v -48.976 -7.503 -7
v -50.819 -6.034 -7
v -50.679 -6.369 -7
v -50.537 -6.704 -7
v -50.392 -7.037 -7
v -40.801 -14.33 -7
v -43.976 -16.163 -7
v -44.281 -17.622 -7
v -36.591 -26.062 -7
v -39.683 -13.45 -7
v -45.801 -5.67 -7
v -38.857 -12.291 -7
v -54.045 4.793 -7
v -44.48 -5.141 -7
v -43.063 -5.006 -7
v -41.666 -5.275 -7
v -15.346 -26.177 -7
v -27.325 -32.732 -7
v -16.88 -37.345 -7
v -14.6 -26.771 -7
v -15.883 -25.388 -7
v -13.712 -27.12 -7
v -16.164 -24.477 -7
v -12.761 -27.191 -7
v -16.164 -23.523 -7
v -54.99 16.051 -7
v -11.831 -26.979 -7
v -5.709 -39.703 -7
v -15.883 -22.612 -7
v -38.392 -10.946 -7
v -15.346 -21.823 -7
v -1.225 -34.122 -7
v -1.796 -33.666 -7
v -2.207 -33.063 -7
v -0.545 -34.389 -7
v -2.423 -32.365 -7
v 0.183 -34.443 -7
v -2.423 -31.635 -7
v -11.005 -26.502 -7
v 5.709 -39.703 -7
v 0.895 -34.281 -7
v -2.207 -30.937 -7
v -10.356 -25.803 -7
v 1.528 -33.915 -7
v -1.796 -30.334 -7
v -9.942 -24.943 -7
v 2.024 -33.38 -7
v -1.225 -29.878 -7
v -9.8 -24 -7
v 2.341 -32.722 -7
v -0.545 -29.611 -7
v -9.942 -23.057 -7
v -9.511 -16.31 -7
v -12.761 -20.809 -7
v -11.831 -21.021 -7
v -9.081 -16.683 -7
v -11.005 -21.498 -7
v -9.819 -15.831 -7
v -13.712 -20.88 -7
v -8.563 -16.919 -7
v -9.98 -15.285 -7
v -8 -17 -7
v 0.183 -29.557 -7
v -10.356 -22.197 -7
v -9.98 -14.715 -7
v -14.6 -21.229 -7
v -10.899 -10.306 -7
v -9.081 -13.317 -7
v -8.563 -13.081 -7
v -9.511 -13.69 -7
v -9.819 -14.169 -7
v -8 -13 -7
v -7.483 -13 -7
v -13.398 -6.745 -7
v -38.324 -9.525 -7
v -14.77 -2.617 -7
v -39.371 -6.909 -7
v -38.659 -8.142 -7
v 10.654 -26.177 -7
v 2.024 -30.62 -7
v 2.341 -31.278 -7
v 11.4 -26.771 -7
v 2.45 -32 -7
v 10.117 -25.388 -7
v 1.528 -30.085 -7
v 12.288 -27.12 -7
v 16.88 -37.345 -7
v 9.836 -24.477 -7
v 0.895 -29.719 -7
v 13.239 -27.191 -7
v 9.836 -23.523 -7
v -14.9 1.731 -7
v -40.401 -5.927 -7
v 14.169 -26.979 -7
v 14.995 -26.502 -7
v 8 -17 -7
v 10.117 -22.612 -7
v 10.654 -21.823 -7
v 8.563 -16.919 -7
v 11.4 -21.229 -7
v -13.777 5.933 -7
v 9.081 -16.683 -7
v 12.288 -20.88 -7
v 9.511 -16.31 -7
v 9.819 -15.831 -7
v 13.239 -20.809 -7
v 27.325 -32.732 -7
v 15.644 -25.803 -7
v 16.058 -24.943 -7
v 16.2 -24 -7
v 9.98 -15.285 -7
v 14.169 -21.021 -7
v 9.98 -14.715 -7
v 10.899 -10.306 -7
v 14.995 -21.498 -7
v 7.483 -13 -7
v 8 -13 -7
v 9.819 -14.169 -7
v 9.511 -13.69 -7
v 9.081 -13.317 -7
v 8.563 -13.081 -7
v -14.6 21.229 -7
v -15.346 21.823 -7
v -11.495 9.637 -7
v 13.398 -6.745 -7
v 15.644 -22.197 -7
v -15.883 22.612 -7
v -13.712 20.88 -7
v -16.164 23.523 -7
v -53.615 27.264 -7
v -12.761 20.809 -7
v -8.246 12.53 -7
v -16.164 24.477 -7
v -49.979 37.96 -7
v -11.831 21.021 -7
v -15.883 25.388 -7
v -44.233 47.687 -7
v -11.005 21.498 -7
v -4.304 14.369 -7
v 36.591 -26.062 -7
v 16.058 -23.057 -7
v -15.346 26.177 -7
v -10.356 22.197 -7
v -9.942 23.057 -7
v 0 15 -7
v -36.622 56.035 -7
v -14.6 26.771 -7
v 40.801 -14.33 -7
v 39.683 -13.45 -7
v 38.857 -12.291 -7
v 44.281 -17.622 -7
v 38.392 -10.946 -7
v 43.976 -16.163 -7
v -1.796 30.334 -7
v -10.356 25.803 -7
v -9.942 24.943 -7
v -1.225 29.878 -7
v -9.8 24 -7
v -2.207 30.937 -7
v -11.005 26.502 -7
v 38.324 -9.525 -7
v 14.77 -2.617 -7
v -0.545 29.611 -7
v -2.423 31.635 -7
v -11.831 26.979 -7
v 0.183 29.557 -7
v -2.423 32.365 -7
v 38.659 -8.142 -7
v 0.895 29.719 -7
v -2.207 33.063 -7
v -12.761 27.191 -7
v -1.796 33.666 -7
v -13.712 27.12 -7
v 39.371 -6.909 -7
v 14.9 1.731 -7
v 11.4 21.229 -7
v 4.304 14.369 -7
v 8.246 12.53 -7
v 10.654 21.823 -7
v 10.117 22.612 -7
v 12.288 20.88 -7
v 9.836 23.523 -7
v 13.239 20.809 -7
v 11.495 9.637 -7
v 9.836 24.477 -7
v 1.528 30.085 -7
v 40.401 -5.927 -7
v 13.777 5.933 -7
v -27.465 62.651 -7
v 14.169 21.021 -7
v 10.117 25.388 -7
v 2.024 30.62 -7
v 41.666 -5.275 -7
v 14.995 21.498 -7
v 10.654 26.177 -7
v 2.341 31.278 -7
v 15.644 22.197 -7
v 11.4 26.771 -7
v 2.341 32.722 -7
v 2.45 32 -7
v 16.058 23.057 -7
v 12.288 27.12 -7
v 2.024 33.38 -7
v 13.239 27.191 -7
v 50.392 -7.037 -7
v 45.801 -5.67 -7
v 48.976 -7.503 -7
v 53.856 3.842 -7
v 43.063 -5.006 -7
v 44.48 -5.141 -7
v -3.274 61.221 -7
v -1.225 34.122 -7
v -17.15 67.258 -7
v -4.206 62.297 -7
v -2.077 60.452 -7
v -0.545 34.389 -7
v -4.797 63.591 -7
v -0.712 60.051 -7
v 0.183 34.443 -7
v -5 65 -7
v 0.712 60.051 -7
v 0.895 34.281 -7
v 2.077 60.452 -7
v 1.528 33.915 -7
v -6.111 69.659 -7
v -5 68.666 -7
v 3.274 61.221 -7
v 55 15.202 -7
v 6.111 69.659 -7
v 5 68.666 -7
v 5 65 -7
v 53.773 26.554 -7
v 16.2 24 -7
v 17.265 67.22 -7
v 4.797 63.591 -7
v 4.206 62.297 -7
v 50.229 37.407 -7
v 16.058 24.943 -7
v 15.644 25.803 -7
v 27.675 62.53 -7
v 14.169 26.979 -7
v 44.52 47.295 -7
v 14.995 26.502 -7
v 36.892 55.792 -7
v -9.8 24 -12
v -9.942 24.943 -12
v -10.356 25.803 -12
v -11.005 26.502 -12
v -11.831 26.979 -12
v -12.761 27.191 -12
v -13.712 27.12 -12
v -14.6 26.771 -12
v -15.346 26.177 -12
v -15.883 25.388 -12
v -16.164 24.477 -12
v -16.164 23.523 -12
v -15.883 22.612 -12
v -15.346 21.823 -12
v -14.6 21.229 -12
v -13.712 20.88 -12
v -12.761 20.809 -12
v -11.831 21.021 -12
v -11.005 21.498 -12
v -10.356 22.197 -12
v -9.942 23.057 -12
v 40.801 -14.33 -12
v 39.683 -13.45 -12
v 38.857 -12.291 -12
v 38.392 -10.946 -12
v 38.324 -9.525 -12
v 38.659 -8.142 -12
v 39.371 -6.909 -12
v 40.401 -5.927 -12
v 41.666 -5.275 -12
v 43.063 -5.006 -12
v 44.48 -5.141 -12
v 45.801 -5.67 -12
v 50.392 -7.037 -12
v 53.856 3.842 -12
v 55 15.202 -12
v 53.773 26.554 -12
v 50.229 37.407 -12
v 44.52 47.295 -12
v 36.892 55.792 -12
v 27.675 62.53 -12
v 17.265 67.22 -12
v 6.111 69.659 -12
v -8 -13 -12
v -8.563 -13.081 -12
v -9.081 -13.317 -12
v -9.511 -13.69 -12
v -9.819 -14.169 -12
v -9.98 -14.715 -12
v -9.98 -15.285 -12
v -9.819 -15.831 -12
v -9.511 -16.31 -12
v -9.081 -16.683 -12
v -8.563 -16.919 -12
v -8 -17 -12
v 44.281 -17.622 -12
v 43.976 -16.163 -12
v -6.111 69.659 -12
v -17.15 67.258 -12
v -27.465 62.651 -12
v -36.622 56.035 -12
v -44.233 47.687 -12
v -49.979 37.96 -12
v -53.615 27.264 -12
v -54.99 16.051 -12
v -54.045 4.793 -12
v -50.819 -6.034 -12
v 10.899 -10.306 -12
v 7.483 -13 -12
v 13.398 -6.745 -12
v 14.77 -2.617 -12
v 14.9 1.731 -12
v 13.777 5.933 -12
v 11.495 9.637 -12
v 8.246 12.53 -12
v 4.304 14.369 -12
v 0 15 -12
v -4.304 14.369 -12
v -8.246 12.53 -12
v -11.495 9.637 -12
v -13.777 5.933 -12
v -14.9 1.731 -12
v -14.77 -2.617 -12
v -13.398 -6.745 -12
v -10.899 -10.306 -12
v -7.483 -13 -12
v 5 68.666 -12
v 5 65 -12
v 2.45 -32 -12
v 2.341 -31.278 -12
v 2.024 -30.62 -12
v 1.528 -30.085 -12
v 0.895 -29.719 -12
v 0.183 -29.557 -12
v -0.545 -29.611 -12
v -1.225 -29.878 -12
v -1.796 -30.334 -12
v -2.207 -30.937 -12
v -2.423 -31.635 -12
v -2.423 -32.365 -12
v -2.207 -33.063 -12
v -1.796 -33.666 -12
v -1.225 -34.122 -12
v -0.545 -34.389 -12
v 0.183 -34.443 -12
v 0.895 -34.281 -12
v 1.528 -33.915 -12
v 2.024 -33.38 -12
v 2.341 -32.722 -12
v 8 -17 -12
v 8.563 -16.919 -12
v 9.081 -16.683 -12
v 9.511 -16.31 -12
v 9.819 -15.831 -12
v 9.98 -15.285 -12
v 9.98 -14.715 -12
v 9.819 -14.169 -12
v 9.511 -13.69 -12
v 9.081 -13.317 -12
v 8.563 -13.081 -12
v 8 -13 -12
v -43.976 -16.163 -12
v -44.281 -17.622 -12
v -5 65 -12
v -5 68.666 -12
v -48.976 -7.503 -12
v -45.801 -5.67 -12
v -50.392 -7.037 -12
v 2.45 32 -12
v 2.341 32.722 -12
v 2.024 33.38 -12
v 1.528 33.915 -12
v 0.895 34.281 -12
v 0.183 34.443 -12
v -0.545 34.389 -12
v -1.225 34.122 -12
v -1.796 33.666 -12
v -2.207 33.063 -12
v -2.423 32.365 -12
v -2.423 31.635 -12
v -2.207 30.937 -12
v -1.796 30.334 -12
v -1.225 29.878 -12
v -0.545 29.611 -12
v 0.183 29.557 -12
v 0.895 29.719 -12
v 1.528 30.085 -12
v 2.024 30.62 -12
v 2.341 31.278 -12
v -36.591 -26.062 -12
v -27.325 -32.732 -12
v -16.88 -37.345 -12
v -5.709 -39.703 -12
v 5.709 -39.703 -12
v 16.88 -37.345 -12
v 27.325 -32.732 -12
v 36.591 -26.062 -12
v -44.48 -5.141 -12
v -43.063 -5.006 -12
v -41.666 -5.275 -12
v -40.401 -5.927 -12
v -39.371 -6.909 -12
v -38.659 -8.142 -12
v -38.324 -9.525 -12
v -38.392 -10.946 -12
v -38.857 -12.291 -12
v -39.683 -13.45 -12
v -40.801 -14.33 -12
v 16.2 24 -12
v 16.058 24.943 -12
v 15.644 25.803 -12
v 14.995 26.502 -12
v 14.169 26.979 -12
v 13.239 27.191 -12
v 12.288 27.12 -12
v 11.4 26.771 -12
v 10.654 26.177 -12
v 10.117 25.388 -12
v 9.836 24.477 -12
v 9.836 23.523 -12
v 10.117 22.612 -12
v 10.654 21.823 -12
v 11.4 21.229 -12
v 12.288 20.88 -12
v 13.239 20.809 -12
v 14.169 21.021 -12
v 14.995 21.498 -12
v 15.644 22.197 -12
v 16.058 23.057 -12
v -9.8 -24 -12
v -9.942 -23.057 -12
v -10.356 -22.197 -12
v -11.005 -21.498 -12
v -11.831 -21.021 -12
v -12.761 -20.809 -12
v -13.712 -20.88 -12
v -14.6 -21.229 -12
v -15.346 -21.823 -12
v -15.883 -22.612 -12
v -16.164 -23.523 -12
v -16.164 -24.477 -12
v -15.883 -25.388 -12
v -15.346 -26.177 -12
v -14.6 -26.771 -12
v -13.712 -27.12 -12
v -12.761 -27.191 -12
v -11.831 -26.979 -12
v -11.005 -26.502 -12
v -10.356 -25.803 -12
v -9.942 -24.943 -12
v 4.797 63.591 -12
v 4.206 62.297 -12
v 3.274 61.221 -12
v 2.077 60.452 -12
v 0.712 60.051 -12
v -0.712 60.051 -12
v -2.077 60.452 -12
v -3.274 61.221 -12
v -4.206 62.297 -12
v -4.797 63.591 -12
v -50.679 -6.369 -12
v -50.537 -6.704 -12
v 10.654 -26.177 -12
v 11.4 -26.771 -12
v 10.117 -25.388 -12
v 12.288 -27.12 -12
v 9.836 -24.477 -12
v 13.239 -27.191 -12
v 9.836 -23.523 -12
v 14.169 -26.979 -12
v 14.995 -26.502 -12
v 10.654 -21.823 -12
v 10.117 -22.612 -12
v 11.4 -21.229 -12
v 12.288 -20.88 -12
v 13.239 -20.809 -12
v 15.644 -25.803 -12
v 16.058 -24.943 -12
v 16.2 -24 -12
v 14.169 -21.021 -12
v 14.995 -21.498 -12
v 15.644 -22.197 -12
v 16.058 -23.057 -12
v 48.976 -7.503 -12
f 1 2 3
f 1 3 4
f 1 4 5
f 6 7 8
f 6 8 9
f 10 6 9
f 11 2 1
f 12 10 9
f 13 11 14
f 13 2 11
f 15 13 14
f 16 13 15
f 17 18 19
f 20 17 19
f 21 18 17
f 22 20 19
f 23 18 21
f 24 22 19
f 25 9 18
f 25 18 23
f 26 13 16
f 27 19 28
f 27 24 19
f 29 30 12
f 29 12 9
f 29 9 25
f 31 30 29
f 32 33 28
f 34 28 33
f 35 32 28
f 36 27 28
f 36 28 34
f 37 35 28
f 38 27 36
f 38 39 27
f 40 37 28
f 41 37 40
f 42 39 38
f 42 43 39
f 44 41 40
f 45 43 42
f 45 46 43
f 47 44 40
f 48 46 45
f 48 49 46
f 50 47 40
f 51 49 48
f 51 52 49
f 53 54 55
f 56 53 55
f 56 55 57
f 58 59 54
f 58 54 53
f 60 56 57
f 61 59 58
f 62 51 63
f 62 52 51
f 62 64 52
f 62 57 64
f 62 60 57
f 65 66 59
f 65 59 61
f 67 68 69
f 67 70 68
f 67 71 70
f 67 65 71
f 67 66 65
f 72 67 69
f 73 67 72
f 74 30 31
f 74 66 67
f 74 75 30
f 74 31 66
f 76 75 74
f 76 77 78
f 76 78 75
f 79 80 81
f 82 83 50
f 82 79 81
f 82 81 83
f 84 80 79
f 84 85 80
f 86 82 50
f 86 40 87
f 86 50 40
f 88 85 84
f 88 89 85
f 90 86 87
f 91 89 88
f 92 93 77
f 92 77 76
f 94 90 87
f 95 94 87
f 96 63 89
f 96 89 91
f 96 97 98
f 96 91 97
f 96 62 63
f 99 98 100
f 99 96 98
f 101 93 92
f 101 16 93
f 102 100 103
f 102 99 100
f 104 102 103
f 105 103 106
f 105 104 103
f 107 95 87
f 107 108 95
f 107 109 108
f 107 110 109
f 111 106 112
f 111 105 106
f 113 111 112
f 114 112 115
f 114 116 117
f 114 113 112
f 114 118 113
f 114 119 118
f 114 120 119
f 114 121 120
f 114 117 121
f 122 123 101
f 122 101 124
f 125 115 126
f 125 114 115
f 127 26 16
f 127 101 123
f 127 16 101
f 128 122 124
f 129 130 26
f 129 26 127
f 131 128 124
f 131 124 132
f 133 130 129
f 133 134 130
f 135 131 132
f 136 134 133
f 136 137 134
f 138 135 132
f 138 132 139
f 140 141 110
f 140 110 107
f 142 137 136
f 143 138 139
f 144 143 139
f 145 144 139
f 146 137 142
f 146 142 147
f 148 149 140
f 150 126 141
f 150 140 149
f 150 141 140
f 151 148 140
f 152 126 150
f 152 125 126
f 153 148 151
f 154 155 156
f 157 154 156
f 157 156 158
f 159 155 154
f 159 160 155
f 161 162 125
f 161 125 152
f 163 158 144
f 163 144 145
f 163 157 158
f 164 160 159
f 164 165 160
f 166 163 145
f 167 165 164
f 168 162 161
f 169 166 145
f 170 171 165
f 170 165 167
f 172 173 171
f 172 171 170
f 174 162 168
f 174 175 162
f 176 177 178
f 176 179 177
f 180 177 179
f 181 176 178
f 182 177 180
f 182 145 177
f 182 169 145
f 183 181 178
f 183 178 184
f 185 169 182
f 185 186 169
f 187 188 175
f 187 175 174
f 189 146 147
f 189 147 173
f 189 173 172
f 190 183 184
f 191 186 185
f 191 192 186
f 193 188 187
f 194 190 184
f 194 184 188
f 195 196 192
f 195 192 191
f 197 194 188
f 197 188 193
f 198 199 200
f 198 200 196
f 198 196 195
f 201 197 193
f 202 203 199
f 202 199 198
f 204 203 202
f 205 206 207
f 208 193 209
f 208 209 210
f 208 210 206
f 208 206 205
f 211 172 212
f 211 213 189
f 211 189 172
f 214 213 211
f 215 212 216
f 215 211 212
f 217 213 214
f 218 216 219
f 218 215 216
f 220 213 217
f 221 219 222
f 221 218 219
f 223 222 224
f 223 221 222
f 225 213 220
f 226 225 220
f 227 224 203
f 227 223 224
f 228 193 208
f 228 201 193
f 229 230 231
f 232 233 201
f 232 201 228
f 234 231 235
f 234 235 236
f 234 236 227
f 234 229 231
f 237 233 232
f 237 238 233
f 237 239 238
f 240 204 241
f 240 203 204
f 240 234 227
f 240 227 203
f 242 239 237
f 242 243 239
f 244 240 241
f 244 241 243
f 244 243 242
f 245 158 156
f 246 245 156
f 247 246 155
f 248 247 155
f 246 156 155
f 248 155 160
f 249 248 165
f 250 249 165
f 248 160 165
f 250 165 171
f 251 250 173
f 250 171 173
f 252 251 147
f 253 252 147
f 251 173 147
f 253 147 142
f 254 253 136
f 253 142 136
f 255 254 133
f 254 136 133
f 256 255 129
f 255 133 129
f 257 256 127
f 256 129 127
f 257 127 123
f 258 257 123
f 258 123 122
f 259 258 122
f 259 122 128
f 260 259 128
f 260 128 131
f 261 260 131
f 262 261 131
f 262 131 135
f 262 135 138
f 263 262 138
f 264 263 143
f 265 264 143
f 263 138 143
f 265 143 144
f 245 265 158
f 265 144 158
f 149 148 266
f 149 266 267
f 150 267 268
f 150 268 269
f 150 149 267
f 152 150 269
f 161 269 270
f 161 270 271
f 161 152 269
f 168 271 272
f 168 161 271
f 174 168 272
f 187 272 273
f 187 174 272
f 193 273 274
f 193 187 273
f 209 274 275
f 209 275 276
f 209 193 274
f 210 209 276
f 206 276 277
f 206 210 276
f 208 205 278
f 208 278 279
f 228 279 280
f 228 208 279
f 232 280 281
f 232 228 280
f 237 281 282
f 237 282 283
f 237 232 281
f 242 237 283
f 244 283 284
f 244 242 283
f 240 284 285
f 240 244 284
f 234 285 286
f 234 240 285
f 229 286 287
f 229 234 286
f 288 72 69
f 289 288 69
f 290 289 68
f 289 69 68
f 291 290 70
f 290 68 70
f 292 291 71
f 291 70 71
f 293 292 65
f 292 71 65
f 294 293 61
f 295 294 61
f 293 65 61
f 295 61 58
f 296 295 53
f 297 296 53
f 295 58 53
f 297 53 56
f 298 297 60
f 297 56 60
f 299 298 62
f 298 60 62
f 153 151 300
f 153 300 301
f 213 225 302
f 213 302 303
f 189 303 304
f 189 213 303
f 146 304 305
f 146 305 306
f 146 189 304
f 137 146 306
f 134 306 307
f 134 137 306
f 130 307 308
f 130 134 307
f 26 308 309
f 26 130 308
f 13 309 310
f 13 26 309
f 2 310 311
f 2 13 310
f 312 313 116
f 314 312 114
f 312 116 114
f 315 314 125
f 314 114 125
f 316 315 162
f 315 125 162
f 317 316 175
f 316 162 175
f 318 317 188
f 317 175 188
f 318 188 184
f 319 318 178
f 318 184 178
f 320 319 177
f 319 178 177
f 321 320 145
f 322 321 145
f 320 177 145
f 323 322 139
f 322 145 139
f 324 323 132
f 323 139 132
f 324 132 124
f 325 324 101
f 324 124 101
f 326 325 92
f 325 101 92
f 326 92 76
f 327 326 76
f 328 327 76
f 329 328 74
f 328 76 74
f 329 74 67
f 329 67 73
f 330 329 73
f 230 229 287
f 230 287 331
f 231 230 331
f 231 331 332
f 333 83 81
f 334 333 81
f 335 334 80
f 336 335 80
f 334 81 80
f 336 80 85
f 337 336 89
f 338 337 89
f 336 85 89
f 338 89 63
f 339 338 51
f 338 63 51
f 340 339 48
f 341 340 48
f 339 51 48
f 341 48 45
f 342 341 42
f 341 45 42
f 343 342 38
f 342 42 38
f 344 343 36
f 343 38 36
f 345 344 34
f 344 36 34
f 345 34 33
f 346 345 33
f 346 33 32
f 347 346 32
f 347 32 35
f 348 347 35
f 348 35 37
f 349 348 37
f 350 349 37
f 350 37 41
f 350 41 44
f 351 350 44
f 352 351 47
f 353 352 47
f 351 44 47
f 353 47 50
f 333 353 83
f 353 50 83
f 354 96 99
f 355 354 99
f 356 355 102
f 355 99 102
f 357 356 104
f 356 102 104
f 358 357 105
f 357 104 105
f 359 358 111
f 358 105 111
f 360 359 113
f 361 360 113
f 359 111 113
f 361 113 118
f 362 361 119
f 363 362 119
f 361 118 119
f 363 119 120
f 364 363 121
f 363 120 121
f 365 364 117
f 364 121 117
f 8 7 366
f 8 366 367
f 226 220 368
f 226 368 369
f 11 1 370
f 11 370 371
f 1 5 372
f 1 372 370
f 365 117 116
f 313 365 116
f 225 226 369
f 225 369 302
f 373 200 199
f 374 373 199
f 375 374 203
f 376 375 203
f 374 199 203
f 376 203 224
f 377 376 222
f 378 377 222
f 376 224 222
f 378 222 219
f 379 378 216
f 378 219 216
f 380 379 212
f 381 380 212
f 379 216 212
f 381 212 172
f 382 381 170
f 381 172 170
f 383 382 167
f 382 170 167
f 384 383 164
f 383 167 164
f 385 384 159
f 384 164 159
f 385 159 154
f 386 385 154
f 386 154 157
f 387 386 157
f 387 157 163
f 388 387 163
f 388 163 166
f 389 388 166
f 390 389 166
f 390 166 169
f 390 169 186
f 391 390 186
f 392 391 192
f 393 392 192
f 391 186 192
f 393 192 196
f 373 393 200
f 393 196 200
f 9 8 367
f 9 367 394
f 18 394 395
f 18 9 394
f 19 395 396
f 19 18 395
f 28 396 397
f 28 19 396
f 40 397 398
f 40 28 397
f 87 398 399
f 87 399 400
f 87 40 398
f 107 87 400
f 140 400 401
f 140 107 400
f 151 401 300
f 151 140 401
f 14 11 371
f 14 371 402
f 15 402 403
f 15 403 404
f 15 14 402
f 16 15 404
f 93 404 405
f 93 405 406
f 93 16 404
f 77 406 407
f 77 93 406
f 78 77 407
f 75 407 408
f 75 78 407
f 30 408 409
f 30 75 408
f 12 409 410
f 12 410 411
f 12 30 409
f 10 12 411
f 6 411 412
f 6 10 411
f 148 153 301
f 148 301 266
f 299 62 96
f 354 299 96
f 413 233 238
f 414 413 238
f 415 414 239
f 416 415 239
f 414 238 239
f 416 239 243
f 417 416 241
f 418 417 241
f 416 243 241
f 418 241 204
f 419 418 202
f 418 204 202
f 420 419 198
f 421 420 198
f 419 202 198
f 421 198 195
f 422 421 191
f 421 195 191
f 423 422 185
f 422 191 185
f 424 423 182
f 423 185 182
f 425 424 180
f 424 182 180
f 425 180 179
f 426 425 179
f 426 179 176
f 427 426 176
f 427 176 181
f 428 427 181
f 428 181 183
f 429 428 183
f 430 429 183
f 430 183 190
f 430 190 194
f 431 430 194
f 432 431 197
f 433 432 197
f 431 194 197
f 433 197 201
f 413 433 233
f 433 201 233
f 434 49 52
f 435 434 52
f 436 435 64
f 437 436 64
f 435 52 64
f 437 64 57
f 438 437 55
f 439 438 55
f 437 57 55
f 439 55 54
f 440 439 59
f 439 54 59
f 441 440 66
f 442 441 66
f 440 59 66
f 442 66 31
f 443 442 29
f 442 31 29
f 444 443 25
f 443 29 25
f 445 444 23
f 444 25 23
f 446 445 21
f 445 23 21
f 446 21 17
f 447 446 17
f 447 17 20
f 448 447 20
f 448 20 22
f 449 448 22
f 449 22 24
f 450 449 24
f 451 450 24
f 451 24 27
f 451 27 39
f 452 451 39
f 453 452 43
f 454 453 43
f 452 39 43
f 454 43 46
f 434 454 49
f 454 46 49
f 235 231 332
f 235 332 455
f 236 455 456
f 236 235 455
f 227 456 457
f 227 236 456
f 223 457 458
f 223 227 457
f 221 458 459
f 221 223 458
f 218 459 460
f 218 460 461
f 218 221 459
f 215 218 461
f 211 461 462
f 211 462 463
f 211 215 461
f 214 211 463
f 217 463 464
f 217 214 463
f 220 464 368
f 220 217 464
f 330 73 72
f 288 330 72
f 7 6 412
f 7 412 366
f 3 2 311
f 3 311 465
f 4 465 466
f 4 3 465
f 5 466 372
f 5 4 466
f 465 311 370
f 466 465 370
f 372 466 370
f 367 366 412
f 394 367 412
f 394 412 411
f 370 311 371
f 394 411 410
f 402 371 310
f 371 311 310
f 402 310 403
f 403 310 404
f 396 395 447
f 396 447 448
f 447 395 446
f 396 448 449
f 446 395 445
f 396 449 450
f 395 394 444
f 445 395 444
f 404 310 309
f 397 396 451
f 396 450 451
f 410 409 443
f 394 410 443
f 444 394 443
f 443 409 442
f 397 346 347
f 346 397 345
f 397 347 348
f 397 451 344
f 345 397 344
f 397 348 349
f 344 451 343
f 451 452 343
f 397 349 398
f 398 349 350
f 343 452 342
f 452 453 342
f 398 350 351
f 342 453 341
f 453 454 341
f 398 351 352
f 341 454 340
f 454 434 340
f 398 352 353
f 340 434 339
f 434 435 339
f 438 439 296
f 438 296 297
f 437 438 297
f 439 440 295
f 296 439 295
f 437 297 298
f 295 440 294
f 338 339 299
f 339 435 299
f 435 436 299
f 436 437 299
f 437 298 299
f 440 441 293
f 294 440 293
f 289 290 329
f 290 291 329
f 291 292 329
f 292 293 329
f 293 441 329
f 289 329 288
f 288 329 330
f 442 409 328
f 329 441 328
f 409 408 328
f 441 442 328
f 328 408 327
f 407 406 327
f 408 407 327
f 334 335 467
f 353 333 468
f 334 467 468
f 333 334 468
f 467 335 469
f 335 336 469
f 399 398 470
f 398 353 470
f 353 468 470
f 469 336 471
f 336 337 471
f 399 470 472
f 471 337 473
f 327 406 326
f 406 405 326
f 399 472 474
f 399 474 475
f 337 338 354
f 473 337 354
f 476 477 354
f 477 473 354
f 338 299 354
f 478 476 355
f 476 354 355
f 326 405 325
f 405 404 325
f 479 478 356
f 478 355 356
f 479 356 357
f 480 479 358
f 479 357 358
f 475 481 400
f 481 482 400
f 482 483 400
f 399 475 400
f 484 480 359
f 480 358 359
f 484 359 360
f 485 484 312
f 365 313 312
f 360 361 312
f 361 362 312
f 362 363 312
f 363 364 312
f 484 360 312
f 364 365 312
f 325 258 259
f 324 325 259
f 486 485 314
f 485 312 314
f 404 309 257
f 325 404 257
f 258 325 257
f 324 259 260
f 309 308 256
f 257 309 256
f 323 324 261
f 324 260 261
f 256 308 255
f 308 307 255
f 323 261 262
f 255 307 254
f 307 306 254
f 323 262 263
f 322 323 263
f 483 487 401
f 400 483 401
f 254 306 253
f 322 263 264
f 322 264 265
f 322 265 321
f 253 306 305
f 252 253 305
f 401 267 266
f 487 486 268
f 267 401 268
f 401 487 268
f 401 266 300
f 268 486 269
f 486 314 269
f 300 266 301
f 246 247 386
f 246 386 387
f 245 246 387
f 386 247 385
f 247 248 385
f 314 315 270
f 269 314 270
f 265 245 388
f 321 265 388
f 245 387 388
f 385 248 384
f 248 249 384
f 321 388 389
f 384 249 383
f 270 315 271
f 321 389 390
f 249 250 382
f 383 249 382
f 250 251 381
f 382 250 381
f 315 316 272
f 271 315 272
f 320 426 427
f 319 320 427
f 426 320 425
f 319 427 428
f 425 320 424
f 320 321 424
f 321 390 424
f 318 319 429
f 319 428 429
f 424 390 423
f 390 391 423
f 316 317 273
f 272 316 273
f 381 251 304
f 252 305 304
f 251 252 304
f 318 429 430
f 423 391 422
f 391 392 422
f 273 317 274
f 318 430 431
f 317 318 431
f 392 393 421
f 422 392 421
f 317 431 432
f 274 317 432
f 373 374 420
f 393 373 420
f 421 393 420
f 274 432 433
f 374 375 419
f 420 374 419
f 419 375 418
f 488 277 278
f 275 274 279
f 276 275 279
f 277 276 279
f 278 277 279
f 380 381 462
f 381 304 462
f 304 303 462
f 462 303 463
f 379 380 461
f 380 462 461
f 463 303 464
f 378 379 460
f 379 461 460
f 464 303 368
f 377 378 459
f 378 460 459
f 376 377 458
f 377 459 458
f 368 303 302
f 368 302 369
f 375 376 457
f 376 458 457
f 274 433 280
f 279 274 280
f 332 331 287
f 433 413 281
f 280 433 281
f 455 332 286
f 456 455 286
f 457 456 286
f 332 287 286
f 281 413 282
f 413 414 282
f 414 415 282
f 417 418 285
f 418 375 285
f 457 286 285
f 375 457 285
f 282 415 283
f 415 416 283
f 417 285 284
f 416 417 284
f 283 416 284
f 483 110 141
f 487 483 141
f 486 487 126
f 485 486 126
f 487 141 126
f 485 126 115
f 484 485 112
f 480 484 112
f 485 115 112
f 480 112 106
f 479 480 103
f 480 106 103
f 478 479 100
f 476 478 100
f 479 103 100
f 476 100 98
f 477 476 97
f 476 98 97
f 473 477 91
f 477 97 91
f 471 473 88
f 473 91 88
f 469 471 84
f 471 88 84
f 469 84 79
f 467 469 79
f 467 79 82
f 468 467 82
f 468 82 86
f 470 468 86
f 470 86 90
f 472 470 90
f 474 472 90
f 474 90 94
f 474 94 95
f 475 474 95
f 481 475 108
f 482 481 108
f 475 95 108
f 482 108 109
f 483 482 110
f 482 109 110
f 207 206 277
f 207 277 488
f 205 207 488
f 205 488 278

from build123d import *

# Parameters (mm, degrees)
F1_START      = -7
F0_R          = 2.45
F0_R_2        = 3.2
F0_R_3        = 15
F1_DEPTH      = 5
F3_DEPTH      = 40
F3_DEPTH_BACK = 40


with BuildPart() as f1:
    # F0 (on Top) → F1 (new body)
    with BuildSketch(Plane.XY.offset(F1_START)):
        with BuildLine():
            Line((48.9758001545, -7.5026887111), (50.3920186759, -7.0373422574))
            ThreePointArc((50.3920186759, -7.0373422574), (47.6313972081, 42.5), (6.1111111111, 69.65943945))
            Line((6.1111111111, 69.65943945), (5, 68.66563146))
            Line((5, 68.66563146), (5, 65))
            ThreePointArc((5, 65), (0, 60), (-5, 65))
            Line((-5, 65), (-5, 68.66563146))
            Line((-5, 68.66563146), (-6.1111111111, 69.65943945))
            ThreePointArc((-6.1111111111, 69.65943945), (-47.3563637716, 42.9709637004), (-50.8191344463, -6.0336771423))
            ThreePointArc((-50.8191344463, -6.0336771423), (-50.6080647229, -6.5365685522), (-50.3920186759, -7.0373422574))
            Line((-50.3920186759, -7.0373422574), (-48.9758001545, -7.5026887111))
            Line((-48.9758001545, -7.5026887111), (-45.8012701892, -5.6698729811))
            ThreePointArc((-45.8012701892, -5.6698729811), (-38.9711431703, -7.5), (-40.8012701892, -14.3301270189))
            Line((-40.8012701892, -14.3301270189), (-43.9758001545, -16.1629427489))
            Line((-43.9758001545, -16.1629427489), (-44.2809075648, -17.6220971926))
            ThreePointArc((-44.2809075648, -17.6220971926), (0, -40), (44.2809075648, -17.6220971926))
            Line((44.2809075648, -17.6220971926), (43.9758001545, -16.1629427489))
            Line((43.9758001545, -16.1629427489), (40.8012701892, -14.3301270189))
            ThreePointArc((40.8012701892, -14.3301270189), (38.9711431703, -7.5), (45.8012701892, -5.6698729811))
            Line((45.8012701892, -5.6698729811), (48.9758001545, -7.5026887111))
        make_face()
        with Locations((0, -32)):
            Circle(F0_R, mode=Mode.SUBTRACT)
        with Locations((-13, -24)):
            Circle(F0_R_2, mode=Mode.SUBTRACT)
        Circle(F0_R_3, mode=Mode.SUBTRACT)
        with Locations((13, -24)):
            Circle(F0_R_2, mode=Mode.SUBTRACT)
        with Locations((-13, 24)):
            Circle(F0_R_2, mode=Mode.SUBTRACT)
        with Locations((0, 32)):
            Circle(F0_R, mode=Mode.SUBTRACT)
        with Locations((13, 24)):
            Circle(F0_R_2, mode=Mode.SUBTRACT)
    extrude(amount=-F1_DEPTH)

    # F2 (on Top) → F3 (cut, two sides)
    with BuildSketch(Plane.XY) as f3_sk:
        with BuildLine():
            Line((0, -13), (-8, -13))
            ThreePointArc((-8, -13), (-10, -15), (-8, -17))
            Line((-8, -17), (0, -17))
            Line((0, -17), (8, -17))
            ThreePointArc((8, -17), (10, -15), (8, -13))
            Line((8, -13), (0, -13))
        make_face()
    extrude(amount=-F3_DEPTH, mode=Mode.SUBTRACT)
    extrude(f3_sk.sketch, amount=F3_DEPTH_BACK, mode=Mode.SUBTRACT)


solid = f1.part
